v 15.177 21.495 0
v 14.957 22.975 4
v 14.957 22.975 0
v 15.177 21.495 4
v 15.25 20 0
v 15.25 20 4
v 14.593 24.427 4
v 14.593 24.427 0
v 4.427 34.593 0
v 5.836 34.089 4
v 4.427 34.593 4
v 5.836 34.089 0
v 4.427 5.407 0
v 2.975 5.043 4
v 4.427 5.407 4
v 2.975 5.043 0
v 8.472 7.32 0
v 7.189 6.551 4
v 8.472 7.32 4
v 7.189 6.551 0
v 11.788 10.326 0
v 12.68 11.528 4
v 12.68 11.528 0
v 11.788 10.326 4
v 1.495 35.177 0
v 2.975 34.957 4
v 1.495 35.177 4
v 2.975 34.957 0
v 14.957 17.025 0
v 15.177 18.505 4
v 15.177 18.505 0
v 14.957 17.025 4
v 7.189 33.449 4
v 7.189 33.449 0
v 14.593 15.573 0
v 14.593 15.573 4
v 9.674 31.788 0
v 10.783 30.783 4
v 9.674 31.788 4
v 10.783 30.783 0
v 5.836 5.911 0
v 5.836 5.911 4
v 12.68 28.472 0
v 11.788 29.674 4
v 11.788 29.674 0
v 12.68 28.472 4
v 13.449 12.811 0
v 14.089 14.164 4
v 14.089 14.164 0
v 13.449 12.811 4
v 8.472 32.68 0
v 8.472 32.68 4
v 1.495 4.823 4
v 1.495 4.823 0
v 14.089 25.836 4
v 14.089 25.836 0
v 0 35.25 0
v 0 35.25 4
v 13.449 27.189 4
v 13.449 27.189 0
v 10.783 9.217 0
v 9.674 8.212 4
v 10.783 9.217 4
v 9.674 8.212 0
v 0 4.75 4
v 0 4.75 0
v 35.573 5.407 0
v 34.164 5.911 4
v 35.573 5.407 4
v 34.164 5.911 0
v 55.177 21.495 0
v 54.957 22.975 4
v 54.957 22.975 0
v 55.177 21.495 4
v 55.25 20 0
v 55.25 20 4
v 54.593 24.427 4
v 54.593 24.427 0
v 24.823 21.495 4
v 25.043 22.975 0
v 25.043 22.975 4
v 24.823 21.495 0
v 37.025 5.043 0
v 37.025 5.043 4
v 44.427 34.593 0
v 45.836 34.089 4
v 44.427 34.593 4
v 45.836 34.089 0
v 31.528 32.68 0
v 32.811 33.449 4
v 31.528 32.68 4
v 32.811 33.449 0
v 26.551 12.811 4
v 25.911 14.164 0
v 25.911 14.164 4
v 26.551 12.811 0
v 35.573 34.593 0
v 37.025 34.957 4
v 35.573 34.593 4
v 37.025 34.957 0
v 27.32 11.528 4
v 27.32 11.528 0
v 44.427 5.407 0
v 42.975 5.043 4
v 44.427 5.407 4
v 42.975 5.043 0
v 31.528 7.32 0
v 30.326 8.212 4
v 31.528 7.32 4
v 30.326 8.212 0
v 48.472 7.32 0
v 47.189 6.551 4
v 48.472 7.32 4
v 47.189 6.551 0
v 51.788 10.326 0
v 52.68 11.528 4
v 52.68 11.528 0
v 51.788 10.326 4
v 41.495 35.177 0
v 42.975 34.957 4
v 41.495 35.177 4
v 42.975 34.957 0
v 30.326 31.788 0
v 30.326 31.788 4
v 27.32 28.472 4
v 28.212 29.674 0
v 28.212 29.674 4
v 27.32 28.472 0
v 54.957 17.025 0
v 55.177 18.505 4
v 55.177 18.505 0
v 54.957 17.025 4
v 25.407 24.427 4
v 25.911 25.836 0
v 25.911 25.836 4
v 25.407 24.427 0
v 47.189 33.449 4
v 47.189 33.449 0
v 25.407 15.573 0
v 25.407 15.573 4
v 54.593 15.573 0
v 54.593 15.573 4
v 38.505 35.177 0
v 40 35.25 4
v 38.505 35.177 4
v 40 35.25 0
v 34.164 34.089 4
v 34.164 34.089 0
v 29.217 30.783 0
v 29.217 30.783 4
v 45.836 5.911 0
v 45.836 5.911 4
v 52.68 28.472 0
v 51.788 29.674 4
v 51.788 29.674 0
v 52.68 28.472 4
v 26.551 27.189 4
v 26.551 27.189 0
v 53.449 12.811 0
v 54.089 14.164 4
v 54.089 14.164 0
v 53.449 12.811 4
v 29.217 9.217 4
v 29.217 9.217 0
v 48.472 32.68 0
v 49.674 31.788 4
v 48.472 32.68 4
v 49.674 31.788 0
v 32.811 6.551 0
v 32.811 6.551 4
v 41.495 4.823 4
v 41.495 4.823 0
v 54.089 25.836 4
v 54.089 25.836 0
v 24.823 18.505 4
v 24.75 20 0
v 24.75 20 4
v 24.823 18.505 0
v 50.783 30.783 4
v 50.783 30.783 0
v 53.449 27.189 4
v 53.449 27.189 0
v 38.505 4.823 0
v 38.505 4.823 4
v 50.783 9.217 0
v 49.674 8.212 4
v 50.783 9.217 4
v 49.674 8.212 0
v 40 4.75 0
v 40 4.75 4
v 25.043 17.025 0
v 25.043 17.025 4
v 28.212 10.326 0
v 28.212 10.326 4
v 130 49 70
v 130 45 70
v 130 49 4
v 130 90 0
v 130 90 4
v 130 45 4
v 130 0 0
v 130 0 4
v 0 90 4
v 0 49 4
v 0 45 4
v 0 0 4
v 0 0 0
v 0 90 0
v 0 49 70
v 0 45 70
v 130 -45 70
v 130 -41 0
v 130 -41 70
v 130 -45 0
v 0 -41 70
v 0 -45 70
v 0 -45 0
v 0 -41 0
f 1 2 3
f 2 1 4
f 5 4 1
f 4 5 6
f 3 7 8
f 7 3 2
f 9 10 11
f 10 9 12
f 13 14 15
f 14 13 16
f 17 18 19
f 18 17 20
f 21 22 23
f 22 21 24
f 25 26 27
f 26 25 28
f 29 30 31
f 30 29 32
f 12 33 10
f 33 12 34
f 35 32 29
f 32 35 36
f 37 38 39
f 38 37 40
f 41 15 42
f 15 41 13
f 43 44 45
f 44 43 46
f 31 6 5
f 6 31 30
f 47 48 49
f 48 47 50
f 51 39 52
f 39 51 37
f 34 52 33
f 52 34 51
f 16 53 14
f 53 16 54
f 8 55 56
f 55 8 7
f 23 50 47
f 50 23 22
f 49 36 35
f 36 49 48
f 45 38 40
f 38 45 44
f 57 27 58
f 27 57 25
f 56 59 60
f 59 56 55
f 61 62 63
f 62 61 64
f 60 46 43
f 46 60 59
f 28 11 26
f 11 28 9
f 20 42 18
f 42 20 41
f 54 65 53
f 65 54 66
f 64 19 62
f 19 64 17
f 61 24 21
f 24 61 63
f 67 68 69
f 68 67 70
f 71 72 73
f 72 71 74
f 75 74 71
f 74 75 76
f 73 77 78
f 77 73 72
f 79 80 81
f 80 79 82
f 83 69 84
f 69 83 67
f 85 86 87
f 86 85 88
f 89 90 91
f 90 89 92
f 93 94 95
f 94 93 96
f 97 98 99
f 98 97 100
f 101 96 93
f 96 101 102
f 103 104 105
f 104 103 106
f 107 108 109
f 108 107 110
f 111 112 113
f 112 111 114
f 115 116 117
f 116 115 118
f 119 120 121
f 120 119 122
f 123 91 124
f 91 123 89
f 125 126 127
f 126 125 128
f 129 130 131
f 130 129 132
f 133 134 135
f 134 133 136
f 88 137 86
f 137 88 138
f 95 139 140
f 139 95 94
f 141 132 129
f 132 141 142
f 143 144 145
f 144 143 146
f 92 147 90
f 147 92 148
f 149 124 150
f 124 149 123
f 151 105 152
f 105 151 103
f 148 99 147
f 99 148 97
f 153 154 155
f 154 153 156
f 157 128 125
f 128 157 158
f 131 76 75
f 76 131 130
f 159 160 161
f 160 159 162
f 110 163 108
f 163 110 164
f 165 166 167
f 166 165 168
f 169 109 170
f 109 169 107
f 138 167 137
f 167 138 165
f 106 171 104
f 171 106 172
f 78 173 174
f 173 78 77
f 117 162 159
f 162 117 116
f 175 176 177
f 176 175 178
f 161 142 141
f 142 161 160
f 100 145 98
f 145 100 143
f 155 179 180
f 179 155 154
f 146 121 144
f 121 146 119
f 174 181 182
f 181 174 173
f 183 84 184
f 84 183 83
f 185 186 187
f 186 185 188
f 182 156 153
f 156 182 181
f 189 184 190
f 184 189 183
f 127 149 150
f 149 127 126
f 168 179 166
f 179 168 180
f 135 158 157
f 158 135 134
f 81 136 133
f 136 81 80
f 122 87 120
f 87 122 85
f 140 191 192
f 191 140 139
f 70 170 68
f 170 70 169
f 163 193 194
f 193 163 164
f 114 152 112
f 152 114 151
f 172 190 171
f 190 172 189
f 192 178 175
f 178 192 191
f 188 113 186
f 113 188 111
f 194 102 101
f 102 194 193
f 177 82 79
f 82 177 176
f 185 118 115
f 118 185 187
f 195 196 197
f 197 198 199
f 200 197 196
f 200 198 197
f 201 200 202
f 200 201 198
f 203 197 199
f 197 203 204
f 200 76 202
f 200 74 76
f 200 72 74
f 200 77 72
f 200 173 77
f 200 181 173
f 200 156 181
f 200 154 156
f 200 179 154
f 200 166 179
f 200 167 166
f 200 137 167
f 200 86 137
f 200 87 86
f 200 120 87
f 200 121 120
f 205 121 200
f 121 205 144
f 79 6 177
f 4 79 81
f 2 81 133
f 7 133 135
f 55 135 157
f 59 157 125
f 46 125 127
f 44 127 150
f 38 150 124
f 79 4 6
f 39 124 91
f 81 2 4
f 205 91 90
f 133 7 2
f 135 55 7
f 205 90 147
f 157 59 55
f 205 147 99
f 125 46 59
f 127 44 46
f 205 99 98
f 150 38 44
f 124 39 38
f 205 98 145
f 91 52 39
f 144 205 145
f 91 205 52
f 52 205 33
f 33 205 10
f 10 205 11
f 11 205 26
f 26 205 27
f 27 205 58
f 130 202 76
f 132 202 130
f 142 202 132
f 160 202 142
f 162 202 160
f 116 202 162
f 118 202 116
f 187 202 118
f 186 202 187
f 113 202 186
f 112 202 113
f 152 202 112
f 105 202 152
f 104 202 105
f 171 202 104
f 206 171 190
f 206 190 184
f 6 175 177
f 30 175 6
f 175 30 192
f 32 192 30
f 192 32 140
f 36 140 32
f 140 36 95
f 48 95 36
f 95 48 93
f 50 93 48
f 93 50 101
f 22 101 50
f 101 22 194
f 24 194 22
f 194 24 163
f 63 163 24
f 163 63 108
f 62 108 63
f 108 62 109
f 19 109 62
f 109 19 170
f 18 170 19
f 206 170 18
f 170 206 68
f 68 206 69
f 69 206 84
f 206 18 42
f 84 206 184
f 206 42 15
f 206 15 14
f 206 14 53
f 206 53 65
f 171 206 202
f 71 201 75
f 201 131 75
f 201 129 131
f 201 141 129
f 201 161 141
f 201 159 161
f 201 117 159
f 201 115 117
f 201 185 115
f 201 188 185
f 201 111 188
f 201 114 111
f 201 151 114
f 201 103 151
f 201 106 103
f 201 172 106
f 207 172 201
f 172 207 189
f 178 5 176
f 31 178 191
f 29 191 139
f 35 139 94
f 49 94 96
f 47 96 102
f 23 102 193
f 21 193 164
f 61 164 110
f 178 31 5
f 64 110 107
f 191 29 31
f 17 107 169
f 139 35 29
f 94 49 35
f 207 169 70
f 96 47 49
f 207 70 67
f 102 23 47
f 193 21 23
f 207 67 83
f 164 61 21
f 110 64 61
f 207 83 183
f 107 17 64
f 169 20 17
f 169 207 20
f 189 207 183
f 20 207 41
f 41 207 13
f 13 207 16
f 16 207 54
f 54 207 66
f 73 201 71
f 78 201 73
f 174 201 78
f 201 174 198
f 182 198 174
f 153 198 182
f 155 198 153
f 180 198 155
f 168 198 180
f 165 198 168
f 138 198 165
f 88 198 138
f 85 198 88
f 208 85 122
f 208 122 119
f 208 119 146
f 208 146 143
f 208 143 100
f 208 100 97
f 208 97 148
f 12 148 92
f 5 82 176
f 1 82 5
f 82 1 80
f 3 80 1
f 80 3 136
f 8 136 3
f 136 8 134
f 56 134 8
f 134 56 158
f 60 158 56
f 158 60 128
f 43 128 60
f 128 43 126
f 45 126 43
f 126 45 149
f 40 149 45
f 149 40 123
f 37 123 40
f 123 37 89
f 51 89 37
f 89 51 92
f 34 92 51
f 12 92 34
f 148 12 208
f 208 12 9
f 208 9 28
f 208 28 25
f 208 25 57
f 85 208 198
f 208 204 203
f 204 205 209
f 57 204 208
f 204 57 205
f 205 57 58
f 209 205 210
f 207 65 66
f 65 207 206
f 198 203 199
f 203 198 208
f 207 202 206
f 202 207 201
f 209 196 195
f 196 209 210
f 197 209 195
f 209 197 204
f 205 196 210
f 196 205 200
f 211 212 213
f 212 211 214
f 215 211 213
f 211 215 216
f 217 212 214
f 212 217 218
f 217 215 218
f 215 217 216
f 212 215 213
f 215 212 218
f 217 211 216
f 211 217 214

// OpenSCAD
// 50 mL conical tube rack – printed upside-down, then flipped over.
// Print orientation: flat plate on the bed (z = 0..4), walls rising in +Z.
// After flipping: rack stands on the two walls; tubes pass through the holes.

// ---- Plate ----
plate_x   = 130;   // plate length along X (mm)
plate_y   = 90;    // plate width  along Y (mm)
plate_t   = 4;     // plate thickness (mm)

// ---- Tube holes ----
hole_d    = 30.5;  // through-hole diameter (mm)
hole_r    = hole_d / 2;
pitch     = 40;    // centre-to-centre spacing in both X and Y (mm)

// ---- Side walls (run along the two long edges, flush with the plate) ----
wall_len  = 130;   // wall length along X (mm)
wall_t    = 4;     // wall thickness along Y (mm)
wall_h    = 70;    // wall height above the bed (mm)

$fn = 64;

// Hole centres: 2 rows (Y) x 3 columns (X), centred on the plate.
// X offsets: -40, 0, +40   (3 columns, 40 mm pitch)
// Y offsets: -20, +20       (2 rows,    40 mm pitch)
hole_x = [-pitch, 0, pitch];
hole_y = [-pitch / 2, pitch / 2];

// ---- Base plate with six through-holes (sits on the bed, z = 0..4) ----
module plate() { difference() {
    translate([0, 0, 0]) {
        cube([plate_x, plate_y, plate_t]);
    }
    for (hx = hole_x) {
        for (hy = hole_y) {
            translate([hx, hy, -0.5]) {
                cylinder(h = plate_t + 1, r = hole_r, $fn = $fn);
            }
        }
    }
} }

// ---- Two solid walls along the long edges, flush with the plate ----
// Each wall: 130 mm (X) x 4 mm (Y) x 70 mm (Z), centred on the plate in X,
// centred on the plate's long edge in Y (so it spans Y = ±45..±49),
// rising from z = 0 to z = 70.
module walls() { union() {
    // Wall on the +Y edge
    translate([0,  plate_y / 2, 0]) {
        cube([wall_len, wall_t, wall_h]);
    }
    // Wall on the -Y edge
    translate([0, -plate_y / 2, 0]) {
        cube([wall_len, wall_t, wall_h]);
    }
} }

// ---- Assemble the rack in print orientation ----
union() {
    plate();
    walls();
}
